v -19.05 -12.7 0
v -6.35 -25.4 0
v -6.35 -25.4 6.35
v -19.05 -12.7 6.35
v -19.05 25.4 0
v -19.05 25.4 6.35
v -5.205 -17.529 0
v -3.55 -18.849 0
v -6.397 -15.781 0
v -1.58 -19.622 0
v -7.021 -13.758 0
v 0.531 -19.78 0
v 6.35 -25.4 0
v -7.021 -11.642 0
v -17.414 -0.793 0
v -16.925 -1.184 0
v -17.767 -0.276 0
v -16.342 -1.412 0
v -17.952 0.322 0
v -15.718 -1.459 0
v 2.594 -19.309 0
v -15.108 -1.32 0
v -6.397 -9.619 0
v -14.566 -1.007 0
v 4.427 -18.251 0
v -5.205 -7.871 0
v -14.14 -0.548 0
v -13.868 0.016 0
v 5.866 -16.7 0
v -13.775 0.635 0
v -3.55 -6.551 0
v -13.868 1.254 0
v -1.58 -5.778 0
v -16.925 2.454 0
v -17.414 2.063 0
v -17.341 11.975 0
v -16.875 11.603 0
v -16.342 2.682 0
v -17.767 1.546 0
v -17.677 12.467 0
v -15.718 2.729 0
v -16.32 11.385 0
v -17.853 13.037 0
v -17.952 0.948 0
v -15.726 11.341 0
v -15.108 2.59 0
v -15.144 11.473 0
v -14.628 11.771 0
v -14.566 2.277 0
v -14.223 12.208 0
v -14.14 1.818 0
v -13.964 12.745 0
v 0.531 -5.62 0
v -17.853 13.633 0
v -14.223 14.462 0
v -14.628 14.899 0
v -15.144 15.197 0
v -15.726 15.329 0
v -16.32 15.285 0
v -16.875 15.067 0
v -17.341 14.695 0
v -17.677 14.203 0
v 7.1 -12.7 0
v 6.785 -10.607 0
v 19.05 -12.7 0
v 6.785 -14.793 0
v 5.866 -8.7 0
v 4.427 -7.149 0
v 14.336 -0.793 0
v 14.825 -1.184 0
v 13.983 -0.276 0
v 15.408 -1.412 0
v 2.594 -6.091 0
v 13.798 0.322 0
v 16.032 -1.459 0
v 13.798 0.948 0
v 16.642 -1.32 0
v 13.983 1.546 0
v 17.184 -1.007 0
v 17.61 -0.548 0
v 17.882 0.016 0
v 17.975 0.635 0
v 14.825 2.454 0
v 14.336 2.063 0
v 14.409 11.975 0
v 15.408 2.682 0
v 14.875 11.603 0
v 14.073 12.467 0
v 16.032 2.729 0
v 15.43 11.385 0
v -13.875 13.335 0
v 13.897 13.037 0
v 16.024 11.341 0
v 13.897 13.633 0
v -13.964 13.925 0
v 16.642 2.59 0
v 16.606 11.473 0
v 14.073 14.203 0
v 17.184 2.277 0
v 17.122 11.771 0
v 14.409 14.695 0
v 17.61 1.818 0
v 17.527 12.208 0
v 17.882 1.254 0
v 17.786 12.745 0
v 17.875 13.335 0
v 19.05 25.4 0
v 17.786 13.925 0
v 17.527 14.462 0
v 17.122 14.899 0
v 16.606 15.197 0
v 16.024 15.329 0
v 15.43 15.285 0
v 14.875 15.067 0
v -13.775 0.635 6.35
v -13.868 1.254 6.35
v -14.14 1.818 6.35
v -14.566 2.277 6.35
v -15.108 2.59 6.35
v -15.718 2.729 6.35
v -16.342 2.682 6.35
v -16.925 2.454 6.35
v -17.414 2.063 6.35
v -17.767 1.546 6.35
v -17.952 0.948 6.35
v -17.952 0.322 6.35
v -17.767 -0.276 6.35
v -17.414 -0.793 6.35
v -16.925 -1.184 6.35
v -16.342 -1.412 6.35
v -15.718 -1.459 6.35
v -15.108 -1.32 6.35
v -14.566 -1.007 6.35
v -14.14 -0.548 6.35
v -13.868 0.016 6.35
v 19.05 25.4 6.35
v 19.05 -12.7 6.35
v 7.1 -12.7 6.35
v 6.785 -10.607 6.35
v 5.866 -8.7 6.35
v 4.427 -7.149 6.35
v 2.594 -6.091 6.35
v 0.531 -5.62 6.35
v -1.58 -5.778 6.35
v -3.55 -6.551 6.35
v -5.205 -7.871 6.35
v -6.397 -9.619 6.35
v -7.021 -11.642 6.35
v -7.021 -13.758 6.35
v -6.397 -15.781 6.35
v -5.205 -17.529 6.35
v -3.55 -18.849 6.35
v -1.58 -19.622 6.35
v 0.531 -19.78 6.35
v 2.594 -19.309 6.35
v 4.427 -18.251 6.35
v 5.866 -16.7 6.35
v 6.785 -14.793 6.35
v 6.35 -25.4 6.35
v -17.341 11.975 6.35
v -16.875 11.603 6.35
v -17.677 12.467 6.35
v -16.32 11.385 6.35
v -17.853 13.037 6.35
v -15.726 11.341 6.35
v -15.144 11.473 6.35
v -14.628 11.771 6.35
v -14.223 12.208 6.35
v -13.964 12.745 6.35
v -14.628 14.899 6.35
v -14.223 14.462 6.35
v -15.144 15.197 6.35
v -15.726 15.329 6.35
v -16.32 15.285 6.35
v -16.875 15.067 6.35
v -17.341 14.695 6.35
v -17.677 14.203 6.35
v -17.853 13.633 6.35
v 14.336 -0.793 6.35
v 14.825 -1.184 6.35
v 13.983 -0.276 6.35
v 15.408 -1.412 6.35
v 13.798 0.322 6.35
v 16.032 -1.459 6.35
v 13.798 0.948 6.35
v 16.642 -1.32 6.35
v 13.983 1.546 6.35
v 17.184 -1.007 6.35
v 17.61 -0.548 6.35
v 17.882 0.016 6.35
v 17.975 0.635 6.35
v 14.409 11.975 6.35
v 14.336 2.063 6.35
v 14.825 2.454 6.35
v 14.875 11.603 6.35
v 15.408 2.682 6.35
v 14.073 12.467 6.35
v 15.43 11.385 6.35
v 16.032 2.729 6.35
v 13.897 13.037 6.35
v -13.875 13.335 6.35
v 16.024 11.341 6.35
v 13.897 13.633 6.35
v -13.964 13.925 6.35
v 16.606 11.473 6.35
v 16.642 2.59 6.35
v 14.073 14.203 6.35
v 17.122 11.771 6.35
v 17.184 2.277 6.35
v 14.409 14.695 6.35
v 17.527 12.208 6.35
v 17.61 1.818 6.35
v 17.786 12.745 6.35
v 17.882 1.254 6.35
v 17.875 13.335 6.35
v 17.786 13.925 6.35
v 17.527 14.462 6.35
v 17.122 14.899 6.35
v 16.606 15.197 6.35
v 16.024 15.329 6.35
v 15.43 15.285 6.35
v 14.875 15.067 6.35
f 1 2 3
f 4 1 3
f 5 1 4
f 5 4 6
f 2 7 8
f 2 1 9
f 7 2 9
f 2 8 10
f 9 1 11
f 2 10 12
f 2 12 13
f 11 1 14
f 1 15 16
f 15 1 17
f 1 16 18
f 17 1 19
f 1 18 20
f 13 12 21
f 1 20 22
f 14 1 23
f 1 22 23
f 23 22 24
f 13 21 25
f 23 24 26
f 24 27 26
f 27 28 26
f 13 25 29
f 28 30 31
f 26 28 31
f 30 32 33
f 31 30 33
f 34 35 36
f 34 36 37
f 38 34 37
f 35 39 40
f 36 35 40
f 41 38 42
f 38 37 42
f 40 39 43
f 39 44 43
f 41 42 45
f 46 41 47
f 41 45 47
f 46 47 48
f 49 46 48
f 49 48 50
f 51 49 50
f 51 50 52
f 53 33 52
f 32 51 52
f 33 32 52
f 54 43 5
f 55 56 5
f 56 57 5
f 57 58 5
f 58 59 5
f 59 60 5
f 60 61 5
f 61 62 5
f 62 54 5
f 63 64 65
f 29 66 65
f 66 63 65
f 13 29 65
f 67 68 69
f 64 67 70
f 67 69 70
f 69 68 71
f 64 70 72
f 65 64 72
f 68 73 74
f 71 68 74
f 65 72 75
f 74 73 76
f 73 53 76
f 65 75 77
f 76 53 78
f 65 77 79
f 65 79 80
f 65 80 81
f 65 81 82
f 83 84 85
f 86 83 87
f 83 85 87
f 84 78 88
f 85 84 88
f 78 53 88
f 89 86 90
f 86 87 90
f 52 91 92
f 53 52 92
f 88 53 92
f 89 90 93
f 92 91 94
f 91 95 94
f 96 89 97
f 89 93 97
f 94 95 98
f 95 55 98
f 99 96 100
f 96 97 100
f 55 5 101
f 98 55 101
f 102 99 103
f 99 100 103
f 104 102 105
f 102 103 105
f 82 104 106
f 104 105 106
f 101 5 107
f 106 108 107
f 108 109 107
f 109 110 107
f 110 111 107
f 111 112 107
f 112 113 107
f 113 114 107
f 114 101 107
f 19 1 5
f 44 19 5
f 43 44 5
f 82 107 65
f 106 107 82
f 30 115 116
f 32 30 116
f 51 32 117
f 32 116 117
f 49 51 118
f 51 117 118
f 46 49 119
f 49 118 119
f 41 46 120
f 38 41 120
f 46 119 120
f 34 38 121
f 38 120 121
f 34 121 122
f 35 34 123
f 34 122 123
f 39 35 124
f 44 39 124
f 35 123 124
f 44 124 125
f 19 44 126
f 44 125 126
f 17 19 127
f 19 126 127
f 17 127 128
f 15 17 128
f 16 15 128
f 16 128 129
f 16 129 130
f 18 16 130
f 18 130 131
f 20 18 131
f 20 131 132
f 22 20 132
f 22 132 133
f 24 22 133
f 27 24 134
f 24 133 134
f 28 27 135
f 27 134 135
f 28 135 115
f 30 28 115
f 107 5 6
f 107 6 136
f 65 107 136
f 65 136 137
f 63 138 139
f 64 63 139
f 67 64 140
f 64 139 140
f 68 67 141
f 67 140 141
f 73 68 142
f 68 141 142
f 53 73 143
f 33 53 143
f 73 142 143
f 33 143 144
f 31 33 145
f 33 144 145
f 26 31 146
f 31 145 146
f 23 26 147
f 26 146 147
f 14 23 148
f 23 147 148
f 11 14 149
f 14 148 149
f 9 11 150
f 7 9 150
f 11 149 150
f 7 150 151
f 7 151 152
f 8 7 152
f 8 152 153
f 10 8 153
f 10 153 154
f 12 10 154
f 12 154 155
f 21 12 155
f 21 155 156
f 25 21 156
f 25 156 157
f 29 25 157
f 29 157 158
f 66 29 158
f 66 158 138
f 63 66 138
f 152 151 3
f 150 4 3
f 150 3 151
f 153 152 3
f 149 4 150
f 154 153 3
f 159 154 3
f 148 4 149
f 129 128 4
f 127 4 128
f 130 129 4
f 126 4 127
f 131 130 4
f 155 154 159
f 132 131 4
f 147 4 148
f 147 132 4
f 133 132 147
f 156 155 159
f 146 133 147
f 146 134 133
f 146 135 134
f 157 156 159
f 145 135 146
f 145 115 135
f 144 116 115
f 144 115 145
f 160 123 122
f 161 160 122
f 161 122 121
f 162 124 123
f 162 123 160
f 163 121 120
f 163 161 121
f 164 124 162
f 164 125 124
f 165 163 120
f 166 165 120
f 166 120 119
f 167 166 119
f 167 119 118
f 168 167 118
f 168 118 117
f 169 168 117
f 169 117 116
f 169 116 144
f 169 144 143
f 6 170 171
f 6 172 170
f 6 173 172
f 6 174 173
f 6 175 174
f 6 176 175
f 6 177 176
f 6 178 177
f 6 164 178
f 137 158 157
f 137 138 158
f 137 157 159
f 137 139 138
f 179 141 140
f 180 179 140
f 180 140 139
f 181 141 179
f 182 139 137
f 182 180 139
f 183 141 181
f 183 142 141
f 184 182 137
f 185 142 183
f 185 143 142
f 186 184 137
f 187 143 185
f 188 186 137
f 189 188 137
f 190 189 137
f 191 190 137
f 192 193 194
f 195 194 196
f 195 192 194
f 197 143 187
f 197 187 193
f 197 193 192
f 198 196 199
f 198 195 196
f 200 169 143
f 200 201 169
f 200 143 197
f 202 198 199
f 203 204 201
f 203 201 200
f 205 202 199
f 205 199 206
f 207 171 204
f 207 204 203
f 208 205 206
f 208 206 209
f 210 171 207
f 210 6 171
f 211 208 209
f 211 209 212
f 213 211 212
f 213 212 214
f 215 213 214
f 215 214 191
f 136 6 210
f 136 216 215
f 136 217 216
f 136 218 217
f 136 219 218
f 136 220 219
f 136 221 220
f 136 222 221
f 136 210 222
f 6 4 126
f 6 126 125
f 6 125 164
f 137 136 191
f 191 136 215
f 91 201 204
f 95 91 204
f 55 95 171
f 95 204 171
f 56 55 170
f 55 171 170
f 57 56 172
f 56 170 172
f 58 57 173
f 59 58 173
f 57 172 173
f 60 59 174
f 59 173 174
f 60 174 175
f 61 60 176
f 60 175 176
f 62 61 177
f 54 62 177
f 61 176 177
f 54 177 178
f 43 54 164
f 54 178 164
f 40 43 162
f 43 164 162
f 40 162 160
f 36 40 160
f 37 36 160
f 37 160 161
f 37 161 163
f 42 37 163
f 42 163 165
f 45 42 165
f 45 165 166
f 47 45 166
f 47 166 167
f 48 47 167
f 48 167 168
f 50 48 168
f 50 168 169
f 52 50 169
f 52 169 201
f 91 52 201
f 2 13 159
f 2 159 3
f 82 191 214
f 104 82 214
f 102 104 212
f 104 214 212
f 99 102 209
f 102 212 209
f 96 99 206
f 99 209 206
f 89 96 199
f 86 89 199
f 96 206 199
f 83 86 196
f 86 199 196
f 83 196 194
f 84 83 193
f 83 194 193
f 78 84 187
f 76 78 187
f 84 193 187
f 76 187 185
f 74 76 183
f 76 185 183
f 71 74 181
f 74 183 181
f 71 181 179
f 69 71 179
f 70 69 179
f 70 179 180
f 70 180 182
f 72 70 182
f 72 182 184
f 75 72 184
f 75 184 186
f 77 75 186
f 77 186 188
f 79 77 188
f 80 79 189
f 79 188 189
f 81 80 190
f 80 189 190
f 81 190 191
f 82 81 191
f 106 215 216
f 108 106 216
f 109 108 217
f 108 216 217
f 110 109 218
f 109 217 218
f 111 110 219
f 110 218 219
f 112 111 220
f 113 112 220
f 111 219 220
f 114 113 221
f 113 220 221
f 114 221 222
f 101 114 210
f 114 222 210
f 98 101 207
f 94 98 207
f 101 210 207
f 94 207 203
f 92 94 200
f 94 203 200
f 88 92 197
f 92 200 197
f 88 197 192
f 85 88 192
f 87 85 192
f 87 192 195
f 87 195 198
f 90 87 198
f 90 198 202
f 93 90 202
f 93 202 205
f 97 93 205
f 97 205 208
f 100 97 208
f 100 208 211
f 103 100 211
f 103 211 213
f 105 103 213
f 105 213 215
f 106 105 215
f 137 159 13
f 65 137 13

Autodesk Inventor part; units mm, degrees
ref_plane "YZ Plane" through (0, 0, 0) normal (1, 0, 0) x (0, 1, 0)
ref_plane "XZ Plane" through (0, 0, 0) normal (0, 1, 0) x (-1, 0, 0)
ref_plane "XY Plane" through (0, 0, 0) normal (0, 0, 1) x (1, 0, 0)
sketch "Sketch1" plane through (0, 0, 0) normal (0, 0, 1) x (1, 0, 0)
  line L0 (19.05, -25.4) -> (-19.05, -25.4)
  line L1 (-19.05, -25.4) -> (-19.05, 25.4)
  line L2 (-19.05, 25.4) -> (19.05, 25.4)
  line L3 (19.05, 25.4) -> (19.05, -25.4)
  line L4 (19.05, -25.4) -> (-19.05, 25.4) construction
  line L5 (-19.05, -25.4) -> (19.05, 25.4) construction
  point P0 (0, 0)
  dimension "d0" = 38.1
  dimension "d1" = 50.8
extrude "Extrusion1" add sketch "Sketch1" along normal blind 6.35
chamfer "Chamfer1" distance 12.7 angle 45 2 edges at (19.05, -25.4, 3.175) (-19.05, -25.4, 3.175)
sketch "Sketch2" plane through (0, 0, 6.35) normal (0, 0, 1) x (1, 0, 0)
  line L0 (-19.05, 25.4) -> (-19.05, -12.7) construction
  line L1 (19.05, -12.7) -> (19.05, 25.4) construction
  line L2 (-19.05, -12.7) -> (19.05, -12.7) construction
  line L3 (-6.35, -25.4) -> (6.35, -25.4) construction
  line L4 (0, -25.4) -> (0, 0) construction
  circle A0 centre (0, -12.7) radius 7.1
  circle A1 centre (0, -12.7) radius 17.5 construction
  circle A2 centre (-15.875, 0.635) radius 2.1
  circle A3 centre (-15.875, 13.335) radius 2
  circle A4 centre (15.875, 0.635) radius 2.1
  circle A5 centre (15.875, 13.335) radius 2
  dimension "d7" = 14.2
  dimension "d8" = 12.7
  dimension "d9" = 35
  dimension "d10" = 4.2
  dimension "d11" = 13.335
  dimension "d12" = 3.175
  dimension "d13" = 4
  dimension "d14" = 12.7
  dimension "d15" = 3.175
extrude "Extrusion2" cut sketch "Sketch2" against normal through all
properties part number "Lateral_Support_Connection2" material "Polystyrene"
